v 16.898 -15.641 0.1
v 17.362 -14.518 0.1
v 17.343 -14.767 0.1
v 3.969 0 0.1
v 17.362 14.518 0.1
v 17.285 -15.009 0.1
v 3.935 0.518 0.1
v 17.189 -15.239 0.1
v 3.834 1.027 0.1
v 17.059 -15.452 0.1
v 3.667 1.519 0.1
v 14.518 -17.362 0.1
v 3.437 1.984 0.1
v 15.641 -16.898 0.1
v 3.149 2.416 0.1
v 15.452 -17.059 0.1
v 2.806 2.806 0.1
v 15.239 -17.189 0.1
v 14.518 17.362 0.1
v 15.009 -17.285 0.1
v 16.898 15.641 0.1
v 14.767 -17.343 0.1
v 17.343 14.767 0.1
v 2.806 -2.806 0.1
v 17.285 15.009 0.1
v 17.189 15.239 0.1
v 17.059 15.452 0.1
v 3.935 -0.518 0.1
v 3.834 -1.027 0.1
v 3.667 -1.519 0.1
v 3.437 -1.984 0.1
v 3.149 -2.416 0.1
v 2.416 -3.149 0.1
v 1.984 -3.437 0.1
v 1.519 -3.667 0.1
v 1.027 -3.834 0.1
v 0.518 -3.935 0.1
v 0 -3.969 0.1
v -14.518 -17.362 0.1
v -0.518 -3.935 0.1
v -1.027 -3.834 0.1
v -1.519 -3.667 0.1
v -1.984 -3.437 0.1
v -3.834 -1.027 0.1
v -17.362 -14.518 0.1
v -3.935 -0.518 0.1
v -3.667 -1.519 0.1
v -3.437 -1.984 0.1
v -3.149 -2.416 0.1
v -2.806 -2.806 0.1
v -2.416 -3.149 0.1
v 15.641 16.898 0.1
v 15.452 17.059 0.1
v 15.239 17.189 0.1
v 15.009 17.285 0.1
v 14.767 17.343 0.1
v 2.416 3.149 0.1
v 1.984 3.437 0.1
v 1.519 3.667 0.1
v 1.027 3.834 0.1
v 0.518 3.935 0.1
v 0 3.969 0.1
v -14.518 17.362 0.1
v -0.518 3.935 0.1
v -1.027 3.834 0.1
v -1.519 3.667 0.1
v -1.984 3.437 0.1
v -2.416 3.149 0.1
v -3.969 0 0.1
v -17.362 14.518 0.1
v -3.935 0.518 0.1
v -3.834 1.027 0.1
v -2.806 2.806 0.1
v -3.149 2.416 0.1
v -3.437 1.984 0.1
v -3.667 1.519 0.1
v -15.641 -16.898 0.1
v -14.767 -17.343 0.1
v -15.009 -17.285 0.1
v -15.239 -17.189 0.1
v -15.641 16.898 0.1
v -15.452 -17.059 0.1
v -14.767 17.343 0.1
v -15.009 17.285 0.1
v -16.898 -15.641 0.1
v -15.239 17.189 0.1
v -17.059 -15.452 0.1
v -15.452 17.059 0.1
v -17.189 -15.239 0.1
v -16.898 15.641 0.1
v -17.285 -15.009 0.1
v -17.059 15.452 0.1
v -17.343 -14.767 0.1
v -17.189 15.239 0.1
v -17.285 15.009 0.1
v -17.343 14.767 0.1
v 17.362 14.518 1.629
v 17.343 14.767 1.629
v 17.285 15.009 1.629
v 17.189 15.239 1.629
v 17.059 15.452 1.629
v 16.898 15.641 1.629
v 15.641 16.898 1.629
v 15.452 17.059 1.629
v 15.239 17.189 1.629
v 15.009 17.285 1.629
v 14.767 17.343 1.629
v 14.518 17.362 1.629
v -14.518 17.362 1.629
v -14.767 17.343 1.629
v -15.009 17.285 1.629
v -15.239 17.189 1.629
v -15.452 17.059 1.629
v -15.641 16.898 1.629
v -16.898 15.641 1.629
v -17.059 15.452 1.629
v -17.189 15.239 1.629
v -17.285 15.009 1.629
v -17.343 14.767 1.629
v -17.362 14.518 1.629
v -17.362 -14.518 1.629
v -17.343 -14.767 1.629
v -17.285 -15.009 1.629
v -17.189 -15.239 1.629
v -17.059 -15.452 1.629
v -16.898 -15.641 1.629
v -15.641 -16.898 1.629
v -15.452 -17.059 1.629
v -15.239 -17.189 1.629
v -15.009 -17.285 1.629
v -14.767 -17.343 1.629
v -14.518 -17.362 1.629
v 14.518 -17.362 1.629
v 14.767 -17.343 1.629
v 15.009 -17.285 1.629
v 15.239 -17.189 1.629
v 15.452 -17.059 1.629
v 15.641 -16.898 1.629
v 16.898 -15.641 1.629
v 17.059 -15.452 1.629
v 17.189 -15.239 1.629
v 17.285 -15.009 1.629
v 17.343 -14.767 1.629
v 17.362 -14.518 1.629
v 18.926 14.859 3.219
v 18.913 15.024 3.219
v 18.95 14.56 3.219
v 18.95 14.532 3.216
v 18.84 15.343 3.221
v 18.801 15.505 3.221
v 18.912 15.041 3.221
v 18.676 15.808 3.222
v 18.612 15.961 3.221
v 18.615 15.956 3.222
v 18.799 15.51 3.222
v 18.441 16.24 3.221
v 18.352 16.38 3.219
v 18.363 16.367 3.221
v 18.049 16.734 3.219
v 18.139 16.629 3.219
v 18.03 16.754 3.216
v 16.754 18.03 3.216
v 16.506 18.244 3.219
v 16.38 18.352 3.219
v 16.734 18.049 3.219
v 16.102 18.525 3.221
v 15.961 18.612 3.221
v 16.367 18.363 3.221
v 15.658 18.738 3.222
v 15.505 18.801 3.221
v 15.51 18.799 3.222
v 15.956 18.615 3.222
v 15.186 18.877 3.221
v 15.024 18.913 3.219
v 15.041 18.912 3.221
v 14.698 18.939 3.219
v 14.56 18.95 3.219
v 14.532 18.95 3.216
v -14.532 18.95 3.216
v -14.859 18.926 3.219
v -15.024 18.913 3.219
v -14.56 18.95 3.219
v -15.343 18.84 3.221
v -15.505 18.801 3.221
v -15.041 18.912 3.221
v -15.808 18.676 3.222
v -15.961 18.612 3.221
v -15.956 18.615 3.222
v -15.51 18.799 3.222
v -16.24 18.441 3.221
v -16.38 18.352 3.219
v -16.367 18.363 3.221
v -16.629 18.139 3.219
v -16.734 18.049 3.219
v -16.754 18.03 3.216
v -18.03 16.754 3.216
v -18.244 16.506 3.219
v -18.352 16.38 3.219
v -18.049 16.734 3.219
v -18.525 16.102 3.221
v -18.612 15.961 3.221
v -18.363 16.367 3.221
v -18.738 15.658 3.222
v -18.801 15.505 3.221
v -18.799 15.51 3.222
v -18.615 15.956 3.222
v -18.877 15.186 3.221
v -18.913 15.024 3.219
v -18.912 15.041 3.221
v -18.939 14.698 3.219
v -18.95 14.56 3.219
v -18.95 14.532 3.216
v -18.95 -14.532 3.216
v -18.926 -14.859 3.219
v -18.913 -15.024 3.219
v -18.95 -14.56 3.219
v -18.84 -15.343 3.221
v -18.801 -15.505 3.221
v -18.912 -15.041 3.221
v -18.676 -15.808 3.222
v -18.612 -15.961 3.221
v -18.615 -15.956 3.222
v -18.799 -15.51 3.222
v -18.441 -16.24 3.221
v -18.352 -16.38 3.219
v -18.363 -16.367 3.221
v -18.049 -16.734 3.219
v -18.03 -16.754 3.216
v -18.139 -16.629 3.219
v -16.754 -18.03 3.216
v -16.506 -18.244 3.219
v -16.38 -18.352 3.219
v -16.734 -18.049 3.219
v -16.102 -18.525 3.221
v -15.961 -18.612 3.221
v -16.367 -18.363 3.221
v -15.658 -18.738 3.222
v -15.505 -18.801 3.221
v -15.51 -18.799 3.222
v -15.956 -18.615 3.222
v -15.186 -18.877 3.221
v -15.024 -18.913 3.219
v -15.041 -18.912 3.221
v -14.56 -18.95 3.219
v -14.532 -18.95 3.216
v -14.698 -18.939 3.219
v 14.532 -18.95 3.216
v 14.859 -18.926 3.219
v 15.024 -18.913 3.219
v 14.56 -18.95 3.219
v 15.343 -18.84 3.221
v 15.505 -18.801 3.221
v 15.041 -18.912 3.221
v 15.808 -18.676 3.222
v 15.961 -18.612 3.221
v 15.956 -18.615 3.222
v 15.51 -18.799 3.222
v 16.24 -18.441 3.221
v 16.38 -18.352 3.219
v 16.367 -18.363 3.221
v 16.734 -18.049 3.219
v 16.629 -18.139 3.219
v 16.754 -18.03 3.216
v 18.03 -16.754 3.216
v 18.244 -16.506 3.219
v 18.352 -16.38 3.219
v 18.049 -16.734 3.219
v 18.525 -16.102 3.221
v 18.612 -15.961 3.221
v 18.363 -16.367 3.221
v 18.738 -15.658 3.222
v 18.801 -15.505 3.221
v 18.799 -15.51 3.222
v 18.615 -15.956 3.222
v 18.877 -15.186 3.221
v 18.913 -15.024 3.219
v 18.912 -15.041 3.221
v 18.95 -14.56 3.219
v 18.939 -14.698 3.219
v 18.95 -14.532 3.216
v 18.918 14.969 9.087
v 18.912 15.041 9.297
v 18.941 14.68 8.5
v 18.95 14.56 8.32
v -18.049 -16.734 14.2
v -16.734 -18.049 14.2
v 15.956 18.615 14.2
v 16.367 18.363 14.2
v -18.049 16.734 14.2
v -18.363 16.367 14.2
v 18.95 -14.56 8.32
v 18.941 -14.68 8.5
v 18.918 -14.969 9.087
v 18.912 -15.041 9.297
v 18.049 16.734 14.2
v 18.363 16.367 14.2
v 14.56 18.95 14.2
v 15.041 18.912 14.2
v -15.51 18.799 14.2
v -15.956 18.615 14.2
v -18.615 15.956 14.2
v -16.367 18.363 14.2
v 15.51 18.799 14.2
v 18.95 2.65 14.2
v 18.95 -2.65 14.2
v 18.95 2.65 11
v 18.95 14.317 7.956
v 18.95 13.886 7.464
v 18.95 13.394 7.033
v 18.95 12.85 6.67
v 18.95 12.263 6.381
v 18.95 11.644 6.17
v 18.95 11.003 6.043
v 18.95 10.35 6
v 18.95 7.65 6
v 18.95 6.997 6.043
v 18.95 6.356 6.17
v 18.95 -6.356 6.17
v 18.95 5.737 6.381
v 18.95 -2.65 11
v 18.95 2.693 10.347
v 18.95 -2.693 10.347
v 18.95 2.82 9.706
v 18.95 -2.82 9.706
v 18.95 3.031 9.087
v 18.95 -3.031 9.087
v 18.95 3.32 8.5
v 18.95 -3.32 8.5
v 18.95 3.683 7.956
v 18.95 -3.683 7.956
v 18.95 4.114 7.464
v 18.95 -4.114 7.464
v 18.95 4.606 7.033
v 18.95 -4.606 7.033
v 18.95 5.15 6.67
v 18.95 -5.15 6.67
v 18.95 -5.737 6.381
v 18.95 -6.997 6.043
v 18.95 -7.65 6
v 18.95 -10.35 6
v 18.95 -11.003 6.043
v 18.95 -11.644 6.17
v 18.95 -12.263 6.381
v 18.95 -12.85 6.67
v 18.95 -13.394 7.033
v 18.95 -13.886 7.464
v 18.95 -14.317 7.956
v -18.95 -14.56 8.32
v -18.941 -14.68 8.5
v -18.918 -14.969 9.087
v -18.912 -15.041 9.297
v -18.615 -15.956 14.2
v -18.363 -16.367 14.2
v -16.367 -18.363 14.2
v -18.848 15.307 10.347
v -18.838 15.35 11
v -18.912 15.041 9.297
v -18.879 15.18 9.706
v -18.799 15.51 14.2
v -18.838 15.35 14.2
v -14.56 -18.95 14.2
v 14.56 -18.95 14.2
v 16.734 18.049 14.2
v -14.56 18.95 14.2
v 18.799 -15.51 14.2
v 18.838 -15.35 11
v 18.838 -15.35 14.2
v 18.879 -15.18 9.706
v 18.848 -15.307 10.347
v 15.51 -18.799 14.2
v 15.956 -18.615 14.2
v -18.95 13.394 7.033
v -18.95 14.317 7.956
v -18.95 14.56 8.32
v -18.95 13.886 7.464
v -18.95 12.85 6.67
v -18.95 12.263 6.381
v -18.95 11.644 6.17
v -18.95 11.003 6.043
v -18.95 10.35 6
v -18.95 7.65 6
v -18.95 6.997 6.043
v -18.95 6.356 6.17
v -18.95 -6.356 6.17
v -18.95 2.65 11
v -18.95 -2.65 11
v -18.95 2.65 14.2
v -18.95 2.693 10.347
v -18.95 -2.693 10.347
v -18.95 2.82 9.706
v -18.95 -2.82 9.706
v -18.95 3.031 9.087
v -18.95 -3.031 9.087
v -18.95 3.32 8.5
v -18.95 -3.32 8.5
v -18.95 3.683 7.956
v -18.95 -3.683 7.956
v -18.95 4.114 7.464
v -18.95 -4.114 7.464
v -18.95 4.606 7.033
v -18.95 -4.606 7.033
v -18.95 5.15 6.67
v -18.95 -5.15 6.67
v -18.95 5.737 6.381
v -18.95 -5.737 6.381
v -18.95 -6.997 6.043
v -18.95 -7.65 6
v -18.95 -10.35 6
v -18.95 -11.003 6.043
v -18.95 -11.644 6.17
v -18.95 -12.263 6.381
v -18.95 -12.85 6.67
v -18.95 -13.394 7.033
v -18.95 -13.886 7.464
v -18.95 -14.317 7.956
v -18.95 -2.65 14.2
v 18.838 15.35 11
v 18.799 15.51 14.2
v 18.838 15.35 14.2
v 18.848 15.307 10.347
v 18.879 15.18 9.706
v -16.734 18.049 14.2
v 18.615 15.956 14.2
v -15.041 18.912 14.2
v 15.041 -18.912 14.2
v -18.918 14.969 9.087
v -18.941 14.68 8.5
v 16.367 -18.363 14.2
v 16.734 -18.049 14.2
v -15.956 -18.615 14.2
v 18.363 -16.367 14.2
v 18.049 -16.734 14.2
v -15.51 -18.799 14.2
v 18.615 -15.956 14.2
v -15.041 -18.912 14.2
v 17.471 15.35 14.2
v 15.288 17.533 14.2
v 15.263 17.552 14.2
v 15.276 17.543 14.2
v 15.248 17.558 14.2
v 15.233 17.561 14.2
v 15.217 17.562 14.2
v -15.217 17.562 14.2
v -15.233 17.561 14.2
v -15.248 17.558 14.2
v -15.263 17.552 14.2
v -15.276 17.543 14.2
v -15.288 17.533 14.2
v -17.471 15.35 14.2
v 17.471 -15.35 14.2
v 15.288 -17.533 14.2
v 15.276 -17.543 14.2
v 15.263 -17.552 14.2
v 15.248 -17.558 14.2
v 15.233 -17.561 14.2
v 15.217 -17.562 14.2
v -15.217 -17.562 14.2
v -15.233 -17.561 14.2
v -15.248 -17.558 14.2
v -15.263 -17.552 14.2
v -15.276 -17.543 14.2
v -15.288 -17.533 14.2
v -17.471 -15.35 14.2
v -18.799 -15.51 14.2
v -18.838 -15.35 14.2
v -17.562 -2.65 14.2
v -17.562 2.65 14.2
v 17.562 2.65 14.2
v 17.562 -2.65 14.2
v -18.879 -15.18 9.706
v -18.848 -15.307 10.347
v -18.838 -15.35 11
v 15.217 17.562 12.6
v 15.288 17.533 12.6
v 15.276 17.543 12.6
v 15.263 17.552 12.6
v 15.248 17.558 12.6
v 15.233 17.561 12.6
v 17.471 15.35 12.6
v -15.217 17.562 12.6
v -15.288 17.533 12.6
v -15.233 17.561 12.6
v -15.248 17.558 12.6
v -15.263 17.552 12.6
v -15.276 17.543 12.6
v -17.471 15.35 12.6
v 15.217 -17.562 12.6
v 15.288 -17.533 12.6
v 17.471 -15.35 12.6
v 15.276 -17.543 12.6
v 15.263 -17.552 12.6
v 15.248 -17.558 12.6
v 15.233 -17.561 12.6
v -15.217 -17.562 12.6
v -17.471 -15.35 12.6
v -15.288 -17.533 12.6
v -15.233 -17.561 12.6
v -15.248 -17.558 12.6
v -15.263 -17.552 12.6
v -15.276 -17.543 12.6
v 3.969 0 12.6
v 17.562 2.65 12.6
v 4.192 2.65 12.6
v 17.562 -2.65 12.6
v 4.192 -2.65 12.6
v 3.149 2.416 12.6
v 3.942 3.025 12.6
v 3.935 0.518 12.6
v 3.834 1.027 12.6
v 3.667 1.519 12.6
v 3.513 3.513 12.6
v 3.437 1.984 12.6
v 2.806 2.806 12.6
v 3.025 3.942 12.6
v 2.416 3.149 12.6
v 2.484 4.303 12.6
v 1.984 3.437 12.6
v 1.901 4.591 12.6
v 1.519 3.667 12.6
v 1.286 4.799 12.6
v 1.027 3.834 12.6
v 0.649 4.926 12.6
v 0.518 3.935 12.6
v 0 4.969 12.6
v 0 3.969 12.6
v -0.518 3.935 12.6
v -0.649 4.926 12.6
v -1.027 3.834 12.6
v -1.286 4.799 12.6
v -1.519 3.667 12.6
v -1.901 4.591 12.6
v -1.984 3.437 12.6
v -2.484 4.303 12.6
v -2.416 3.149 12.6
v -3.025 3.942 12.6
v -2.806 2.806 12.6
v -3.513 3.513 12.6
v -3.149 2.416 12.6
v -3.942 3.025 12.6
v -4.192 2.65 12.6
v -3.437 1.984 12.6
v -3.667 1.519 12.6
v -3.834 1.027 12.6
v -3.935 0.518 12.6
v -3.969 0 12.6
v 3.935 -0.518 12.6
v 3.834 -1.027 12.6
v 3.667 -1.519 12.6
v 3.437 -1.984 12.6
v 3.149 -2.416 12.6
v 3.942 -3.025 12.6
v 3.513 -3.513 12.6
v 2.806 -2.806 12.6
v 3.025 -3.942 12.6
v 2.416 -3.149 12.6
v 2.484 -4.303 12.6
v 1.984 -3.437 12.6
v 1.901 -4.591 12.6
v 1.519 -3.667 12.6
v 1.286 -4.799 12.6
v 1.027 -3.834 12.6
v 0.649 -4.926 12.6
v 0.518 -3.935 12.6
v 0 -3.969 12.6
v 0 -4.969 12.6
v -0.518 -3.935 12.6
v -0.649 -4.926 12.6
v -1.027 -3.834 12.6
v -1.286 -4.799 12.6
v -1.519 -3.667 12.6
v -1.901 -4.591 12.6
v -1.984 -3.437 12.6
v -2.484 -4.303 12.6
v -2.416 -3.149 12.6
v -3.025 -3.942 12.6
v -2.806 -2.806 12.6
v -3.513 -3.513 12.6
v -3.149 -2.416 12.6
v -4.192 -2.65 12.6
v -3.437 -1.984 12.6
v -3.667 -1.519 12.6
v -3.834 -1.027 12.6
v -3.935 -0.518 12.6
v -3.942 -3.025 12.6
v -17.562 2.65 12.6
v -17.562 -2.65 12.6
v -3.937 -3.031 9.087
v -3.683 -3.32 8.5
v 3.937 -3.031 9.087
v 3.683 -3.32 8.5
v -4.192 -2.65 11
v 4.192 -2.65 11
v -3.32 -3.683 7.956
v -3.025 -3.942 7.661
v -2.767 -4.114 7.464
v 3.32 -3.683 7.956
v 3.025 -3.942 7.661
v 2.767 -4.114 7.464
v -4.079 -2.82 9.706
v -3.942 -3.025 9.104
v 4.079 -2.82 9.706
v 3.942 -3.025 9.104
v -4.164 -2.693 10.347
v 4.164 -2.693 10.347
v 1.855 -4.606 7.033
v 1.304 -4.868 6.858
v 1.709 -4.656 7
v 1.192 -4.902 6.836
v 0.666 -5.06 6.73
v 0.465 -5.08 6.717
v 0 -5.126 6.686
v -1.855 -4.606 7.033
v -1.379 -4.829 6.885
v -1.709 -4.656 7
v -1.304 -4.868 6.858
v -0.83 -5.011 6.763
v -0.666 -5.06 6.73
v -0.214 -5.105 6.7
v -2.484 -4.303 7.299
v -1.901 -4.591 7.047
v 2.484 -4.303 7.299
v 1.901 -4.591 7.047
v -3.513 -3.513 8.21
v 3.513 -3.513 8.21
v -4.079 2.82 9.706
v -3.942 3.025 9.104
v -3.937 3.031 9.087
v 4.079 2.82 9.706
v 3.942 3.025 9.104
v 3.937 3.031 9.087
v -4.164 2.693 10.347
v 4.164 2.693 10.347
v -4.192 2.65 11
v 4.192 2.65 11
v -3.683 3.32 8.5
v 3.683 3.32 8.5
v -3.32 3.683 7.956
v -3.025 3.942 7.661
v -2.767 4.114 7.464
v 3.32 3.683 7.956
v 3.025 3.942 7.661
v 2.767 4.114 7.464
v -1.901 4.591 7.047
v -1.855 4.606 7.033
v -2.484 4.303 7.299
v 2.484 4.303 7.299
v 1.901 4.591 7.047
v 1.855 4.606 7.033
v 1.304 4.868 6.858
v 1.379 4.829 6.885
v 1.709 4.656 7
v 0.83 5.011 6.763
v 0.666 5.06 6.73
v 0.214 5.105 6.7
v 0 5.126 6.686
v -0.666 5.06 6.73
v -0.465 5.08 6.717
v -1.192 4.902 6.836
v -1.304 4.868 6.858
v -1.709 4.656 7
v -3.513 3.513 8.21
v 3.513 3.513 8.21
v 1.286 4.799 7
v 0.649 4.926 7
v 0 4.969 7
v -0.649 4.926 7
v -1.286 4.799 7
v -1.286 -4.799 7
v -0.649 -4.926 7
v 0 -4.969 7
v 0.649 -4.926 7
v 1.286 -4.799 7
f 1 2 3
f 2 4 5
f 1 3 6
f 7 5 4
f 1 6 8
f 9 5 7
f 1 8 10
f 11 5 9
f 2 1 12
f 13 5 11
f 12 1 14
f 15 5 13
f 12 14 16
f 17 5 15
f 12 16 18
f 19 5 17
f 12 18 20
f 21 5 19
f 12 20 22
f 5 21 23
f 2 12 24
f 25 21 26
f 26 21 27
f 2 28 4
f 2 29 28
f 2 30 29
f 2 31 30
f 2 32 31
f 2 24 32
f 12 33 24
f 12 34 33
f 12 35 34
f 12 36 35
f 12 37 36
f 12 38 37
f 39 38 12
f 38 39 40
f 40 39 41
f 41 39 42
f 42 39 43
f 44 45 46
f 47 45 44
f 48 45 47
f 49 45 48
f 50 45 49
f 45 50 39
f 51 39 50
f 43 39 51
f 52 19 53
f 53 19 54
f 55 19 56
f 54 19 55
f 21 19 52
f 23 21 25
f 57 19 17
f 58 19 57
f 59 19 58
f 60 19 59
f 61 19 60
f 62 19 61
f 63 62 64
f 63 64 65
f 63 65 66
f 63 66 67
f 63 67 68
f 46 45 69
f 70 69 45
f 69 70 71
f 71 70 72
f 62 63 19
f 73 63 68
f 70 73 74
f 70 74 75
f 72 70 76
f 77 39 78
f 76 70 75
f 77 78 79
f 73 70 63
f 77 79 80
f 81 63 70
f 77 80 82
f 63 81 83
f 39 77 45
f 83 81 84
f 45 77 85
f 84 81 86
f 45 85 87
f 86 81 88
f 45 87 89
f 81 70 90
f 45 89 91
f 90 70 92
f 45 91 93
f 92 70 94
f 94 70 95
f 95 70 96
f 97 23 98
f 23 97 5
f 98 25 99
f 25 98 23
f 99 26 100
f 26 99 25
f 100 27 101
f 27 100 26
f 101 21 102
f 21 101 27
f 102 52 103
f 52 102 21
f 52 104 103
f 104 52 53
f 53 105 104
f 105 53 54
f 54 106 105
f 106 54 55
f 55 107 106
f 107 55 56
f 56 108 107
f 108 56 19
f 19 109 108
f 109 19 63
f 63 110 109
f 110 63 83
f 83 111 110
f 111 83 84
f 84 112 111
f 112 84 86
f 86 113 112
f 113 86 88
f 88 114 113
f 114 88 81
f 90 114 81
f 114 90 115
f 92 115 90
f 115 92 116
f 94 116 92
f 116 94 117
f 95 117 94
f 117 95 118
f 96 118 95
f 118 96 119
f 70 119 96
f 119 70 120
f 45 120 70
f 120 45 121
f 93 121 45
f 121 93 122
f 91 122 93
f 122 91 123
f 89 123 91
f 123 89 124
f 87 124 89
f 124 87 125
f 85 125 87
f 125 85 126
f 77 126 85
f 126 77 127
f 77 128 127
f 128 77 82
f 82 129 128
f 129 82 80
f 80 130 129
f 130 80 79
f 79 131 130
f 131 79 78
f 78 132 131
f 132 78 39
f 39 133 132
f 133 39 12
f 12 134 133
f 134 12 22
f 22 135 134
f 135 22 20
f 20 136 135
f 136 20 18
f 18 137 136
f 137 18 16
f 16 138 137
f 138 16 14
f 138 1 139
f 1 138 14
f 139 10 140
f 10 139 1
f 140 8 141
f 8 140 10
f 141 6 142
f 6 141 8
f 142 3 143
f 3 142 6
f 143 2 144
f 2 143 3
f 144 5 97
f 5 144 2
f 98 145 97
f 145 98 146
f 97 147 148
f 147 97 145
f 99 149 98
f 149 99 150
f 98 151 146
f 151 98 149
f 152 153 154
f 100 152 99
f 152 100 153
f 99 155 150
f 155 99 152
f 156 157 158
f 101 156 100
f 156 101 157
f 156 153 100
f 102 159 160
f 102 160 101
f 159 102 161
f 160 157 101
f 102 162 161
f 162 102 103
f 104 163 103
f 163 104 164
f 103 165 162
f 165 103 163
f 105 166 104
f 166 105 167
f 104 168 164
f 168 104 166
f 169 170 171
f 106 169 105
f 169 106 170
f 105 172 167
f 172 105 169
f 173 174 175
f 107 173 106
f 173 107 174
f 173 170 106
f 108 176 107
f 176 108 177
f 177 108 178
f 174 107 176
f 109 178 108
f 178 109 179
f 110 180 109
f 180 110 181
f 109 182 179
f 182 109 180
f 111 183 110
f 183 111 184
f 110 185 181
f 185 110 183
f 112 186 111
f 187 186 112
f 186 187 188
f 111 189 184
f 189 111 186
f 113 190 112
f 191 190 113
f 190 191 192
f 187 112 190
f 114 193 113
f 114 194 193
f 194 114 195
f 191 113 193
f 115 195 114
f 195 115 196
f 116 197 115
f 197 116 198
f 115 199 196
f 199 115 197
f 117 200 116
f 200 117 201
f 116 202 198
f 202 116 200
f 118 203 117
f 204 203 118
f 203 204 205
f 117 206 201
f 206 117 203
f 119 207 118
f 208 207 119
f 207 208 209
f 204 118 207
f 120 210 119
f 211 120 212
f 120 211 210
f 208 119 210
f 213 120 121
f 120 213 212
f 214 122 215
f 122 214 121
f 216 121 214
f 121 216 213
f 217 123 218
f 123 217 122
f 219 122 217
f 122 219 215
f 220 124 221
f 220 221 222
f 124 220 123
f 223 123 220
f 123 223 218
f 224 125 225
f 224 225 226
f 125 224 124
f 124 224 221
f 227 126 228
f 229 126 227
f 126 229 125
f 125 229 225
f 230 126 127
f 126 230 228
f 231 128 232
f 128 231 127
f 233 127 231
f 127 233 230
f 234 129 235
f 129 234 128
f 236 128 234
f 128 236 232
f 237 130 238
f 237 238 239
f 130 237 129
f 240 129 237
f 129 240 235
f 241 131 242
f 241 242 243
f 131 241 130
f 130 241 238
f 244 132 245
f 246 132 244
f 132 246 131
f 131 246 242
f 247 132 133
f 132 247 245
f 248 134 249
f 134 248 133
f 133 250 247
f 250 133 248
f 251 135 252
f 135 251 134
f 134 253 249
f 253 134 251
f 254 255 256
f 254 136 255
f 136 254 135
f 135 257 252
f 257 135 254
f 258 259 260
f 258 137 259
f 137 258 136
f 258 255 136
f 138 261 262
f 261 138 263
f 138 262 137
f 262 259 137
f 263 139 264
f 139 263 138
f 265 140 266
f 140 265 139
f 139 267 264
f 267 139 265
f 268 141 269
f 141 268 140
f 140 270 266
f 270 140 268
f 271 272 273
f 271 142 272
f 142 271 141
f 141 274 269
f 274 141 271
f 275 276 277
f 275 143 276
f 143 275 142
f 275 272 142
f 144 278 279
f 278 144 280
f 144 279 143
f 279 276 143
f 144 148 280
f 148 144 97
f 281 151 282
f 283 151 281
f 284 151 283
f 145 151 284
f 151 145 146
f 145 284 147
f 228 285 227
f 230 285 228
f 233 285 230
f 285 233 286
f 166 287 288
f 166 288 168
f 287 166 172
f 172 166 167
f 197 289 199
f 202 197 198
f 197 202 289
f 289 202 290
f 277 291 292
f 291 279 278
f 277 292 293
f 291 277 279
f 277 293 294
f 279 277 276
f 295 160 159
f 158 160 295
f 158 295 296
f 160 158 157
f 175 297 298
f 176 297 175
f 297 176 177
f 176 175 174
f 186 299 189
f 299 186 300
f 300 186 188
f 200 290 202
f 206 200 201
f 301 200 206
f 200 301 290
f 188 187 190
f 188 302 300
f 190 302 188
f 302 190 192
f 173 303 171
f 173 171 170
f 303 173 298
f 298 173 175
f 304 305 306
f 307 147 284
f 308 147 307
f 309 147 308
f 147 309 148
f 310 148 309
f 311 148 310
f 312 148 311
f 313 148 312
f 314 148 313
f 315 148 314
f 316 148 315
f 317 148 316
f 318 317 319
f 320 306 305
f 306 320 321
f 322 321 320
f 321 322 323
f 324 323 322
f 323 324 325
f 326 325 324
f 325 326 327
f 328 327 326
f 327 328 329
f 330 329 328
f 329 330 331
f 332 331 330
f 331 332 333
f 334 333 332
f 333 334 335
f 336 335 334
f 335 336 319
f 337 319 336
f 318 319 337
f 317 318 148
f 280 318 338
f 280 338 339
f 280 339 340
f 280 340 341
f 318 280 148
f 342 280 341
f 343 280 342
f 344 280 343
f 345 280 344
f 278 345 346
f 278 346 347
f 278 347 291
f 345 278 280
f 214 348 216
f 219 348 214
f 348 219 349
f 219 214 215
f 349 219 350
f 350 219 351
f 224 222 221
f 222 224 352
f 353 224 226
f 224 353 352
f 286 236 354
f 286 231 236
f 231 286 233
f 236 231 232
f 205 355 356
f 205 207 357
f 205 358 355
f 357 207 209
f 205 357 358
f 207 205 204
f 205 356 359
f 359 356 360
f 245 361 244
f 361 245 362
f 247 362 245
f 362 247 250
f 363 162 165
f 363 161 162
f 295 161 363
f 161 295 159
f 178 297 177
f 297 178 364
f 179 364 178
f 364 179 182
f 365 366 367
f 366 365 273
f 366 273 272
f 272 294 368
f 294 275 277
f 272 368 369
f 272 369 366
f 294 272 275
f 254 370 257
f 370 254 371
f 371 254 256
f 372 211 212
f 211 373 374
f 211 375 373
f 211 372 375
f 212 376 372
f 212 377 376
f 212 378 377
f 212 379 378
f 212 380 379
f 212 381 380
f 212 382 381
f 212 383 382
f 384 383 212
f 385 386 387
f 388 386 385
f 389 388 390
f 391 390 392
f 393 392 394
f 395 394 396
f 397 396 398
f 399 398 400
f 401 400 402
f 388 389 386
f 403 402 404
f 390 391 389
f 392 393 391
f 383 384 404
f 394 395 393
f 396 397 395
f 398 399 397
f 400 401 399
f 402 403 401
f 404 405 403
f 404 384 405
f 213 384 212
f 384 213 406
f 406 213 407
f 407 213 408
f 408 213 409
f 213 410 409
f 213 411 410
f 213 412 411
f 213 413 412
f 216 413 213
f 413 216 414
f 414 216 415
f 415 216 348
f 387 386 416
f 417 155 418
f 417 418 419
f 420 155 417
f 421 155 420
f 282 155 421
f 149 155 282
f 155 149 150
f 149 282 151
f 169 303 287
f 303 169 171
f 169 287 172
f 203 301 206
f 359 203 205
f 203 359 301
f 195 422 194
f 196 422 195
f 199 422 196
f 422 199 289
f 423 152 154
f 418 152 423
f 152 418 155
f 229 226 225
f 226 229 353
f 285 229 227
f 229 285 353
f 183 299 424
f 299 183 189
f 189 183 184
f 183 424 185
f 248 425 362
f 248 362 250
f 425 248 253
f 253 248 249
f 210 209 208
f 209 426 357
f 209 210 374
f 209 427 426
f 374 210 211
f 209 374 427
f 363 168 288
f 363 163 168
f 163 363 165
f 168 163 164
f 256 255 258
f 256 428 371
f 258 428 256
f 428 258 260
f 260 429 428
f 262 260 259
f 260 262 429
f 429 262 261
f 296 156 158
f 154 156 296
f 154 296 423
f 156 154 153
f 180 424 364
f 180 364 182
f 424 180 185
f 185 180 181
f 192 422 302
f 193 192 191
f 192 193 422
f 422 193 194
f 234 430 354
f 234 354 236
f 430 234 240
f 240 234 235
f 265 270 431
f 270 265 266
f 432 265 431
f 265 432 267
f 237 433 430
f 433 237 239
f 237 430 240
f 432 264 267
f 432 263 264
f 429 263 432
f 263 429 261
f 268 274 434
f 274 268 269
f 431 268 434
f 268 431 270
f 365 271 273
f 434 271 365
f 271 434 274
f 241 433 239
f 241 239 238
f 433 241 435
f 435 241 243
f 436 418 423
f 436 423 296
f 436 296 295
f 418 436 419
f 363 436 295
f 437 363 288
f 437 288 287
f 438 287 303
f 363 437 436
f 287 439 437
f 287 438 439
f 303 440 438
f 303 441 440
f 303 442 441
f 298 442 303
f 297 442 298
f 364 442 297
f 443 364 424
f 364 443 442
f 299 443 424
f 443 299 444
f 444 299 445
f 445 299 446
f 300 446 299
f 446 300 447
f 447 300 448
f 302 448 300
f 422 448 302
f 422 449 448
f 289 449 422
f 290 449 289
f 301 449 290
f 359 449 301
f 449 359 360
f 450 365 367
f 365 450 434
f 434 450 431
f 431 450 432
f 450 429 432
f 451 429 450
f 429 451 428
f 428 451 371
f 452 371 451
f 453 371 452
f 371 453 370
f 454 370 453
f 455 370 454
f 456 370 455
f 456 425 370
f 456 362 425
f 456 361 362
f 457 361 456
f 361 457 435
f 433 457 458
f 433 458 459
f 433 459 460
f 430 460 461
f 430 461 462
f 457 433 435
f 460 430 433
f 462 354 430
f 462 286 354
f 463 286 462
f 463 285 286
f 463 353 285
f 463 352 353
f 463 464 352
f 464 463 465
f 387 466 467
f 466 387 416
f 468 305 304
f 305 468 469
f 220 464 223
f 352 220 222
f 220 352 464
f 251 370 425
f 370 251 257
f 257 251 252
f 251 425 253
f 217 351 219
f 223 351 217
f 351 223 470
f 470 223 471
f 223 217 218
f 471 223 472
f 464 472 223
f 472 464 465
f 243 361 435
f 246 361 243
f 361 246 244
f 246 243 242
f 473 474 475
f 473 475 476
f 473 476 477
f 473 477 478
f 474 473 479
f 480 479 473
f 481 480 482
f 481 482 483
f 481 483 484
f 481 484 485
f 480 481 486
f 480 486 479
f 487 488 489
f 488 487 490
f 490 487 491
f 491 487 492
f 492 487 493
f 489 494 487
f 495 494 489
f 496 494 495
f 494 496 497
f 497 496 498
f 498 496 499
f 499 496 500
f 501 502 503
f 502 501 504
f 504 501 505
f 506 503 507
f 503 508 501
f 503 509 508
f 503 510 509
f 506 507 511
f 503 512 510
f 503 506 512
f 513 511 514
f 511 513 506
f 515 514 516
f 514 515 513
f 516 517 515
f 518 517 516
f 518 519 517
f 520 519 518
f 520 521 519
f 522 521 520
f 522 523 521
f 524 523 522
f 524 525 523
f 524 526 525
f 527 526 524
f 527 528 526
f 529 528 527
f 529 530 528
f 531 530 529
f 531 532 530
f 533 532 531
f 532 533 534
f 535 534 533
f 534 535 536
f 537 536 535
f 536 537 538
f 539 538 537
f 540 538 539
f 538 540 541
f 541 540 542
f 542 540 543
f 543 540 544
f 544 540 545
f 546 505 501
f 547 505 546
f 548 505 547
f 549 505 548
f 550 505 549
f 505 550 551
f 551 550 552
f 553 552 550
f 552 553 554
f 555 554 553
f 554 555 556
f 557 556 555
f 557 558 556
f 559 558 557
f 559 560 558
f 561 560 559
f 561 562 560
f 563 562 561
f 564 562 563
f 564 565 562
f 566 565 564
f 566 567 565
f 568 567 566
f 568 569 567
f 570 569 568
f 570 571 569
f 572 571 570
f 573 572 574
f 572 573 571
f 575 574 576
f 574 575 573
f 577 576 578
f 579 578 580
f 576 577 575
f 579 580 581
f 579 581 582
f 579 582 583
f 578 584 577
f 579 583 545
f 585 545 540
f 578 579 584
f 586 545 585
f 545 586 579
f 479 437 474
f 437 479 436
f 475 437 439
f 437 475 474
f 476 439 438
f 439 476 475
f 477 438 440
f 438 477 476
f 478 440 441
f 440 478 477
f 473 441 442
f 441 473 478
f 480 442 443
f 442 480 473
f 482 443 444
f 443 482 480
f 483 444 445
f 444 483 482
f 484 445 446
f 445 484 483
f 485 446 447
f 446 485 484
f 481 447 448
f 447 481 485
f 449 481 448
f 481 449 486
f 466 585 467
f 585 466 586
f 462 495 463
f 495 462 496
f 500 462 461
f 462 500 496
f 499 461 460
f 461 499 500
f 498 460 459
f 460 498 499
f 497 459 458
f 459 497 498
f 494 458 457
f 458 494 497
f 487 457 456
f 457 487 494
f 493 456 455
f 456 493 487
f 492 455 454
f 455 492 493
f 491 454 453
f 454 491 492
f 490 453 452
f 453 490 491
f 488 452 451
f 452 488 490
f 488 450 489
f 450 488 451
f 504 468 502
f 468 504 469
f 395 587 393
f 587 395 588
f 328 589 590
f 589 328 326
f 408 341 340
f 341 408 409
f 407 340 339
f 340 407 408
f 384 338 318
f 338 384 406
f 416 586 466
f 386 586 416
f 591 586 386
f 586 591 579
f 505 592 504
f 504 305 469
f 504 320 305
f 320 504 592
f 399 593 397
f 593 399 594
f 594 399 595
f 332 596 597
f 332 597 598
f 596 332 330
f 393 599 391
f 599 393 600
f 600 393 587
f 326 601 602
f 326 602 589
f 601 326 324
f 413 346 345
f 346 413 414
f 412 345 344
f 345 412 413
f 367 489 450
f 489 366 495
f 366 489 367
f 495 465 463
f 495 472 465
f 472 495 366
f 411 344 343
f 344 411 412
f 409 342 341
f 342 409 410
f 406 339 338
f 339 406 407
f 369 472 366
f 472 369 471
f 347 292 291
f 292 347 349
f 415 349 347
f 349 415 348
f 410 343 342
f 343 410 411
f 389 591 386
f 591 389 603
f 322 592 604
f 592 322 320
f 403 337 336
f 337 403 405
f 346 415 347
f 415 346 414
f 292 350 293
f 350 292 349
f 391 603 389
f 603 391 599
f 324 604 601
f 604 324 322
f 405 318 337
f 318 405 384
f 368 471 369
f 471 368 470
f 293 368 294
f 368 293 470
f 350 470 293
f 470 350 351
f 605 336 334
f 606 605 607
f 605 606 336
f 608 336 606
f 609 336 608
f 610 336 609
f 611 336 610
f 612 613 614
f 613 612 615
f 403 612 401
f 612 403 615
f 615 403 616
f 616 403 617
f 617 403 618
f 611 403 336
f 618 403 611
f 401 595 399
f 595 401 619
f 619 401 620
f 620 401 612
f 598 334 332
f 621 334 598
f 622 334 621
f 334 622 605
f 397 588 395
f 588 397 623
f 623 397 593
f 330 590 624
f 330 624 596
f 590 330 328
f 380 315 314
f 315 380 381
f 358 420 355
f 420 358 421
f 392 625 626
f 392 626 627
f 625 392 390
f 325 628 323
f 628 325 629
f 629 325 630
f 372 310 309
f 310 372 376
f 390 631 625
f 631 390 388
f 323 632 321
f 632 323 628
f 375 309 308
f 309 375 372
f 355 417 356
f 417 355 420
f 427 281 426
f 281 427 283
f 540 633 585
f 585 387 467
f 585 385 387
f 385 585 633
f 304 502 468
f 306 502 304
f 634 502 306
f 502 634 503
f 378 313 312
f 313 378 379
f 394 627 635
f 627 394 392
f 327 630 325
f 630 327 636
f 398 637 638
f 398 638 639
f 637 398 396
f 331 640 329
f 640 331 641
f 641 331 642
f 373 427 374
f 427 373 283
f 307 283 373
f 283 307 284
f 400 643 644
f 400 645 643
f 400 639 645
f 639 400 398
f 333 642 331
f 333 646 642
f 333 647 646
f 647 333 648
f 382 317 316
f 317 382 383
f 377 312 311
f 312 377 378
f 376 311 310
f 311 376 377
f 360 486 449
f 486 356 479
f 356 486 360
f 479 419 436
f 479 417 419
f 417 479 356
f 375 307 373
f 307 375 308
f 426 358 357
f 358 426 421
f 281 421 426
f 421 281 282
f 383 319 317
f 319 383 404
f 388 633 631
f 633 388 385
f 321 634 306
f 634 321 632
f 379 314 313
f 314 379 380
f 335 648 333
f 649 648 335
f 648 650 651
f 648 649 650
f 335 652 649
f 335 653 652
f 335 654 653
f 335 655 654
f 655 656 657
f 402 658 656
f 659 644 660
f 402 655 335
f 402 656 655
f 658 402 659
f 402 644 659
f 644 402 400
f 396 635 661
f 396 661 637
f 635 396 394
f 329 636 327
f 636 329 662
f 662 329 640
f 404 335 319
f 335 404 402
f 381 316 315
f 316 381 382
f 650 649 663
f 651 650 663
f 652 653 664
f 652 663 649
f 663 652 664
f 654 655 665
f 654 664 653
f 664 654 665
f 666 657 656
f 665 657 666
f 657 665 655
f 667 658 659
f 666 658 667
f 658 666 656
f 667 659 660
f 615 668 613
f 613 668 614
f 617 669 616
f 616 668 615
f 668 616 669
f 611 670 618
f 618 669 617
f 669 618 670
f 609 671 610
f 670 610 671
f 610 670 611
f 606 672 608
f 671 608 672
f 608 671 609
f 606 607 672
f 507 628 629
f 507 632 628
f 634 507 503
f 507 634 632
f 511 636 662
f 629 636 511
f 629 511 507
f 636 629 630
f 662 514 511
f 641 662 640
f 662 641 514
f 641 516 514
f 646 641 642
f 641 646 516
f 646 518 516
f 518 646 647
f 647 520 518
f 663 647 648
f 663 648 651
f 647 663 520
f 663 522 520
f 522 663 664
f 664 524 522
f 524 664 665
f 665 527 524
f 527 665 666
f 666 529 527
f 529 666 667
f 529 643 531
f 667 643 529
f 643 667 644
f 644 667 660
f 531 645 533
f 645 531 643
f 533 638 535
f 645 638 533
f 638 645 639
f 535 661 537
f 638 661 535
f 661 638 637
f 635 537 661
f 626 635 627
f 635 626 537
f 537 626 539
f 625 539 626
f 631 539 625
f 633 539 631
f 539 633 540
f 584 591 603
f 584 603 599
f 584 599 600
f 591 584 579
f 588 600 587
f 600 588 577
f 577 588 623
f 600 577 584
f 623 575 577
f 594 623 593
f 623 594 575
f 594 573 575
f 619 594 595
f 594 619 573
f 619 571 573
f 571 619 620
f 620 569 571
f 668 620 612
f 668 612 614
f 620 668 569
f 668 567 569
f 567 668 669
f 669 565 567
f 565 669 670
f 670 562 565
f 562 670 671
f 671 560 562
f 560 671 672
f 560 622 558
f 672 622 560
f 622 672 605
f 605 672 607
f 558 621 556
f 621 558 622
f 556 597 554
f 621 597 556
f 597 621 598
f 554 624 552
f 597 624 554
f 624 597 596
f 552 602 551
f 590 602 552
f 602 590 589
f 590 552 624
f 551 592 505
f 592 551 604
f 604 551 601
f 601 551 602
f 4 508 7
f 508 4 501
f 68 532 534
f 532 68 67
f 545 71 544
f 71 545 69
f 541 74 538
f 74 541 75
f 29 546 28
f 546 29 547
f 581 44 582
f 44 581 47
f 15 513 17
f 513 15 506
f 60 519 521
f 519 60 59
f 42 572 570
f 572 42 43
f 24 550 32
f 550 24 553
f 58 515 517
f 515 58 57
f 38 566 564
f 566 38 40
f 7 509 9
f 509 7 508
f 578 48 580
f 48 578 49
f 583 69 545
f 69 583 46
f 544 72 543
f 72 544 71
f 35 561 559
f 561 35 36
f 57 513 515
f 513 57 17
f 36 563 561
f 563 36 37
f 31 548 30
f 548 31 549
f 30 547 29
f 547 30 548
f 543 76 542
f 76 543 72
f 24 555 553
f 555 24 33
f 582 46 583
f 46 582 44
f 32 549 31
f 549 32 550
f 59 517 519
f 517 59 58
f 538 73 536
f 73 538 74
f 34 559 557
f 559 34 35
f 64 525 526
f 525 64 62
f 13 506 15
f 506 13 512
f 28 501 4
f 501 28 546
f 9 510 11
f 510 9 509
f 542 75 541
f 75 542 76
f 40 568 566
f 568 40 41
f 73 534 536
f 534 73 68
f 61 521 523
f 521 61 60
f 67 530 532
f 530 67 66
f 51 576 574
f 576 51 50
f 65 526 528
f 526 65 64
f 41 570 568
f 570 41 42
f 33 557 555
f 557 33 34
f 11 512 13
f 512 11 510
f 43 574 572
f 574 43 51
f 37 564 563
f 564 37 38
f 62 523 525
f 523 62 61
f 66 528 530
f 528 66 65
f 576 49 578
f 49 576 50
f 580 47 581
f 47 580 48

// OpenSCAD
// CableBoltDown0.2
// 
// v0.2:
// - cap, currently thicker than necessary

mode = "block"; // [ "block", "cap" ]

$tgx11_offset = -0.1;

module __ctd0__end_params() { }

block_size_ca = [[1, "chunk"], [1, "chunk"], [8, "u"]];

// 2u would be fine for cap height, but TGx11.1Lib has trouble with it.
// TODO: Fix that.
cap_size_ca = [[1, "chunk"], [1, "chunk"], [4, "u"]];


use <../lib/TGx11.1Lib.scad>
use <../lib/TOGridLib3.scad>
use <../lib/TOGMod1.scad>
use <../lib/TOGPolyhedronLib1.scad>

$fn = $preview ? 16 : 48;

$togridlib3_unit_table = [
	["atom", [24, "u"]],
	["chunk", [1, "atom"]],
	each tgx11_get_default_unit_table(),
];

center_hole_diameter = 7.9375;
center_hole_wall_thickness = 1;
block_size = togridlib3_decode_vector(block_size_ca);

cable_groove_width = 12.7;
cable_groove_depth = block_size[2] - 6;
floor_z = block_size[2] - cable_groove_depth;

function make_block(block_size_ca) = tgx11_block(
	block_size_ca,
	$tgx11_gender = "m",
	lip_height = 1.5
);

cable_groove_r = min(cable_groove_width/2 - 1, 5);
// WOULDN'T IT BE NEAT TO make a bendy tube?
// That would require doing some math.
// Maybe for next edition.
cable_groove = tphl1_make_rounded_cuboid([block_size[0], cable_groove_width, cable_groove_depth*2], [0,cable_groove_r,cable_groove_r]);

thing =
	mode == "block" ? ["difference",
		make_block(block_size_ca),
		tphl1_make_z_cylinder(d=center_hole_diameter, zrange=[-1, block_size[2]+1]),
		["difference",
			["union", for( ym=[-1,1] ) ["scale", [1,ym,1], ["translate", [0,9,block_size[2]], cable_groove]]],
			
			let(cs=center_hole_wall_thickness*2+center_hole_diameter)
			let(bs=1) // Bevel size; less necessary if there's a wall down the middle
			tphl1_make_z_cylinder(zds=[
				[floor_z      , cs + bs],
				[floor_z + bs , cs    ],
				[block_size[2], cs]])
		]
	] :
	mode == "cap" ? ["difference",
		make_block(cap_size_ca),
		tphl1_make_z_cylinder(d=center_hole_diameter, zrange=[-1, block_size[2]+1]),
	] :
	assert(false, str("Unknown mode: '", mode, "'"));

togmod1_domodule(thing);
